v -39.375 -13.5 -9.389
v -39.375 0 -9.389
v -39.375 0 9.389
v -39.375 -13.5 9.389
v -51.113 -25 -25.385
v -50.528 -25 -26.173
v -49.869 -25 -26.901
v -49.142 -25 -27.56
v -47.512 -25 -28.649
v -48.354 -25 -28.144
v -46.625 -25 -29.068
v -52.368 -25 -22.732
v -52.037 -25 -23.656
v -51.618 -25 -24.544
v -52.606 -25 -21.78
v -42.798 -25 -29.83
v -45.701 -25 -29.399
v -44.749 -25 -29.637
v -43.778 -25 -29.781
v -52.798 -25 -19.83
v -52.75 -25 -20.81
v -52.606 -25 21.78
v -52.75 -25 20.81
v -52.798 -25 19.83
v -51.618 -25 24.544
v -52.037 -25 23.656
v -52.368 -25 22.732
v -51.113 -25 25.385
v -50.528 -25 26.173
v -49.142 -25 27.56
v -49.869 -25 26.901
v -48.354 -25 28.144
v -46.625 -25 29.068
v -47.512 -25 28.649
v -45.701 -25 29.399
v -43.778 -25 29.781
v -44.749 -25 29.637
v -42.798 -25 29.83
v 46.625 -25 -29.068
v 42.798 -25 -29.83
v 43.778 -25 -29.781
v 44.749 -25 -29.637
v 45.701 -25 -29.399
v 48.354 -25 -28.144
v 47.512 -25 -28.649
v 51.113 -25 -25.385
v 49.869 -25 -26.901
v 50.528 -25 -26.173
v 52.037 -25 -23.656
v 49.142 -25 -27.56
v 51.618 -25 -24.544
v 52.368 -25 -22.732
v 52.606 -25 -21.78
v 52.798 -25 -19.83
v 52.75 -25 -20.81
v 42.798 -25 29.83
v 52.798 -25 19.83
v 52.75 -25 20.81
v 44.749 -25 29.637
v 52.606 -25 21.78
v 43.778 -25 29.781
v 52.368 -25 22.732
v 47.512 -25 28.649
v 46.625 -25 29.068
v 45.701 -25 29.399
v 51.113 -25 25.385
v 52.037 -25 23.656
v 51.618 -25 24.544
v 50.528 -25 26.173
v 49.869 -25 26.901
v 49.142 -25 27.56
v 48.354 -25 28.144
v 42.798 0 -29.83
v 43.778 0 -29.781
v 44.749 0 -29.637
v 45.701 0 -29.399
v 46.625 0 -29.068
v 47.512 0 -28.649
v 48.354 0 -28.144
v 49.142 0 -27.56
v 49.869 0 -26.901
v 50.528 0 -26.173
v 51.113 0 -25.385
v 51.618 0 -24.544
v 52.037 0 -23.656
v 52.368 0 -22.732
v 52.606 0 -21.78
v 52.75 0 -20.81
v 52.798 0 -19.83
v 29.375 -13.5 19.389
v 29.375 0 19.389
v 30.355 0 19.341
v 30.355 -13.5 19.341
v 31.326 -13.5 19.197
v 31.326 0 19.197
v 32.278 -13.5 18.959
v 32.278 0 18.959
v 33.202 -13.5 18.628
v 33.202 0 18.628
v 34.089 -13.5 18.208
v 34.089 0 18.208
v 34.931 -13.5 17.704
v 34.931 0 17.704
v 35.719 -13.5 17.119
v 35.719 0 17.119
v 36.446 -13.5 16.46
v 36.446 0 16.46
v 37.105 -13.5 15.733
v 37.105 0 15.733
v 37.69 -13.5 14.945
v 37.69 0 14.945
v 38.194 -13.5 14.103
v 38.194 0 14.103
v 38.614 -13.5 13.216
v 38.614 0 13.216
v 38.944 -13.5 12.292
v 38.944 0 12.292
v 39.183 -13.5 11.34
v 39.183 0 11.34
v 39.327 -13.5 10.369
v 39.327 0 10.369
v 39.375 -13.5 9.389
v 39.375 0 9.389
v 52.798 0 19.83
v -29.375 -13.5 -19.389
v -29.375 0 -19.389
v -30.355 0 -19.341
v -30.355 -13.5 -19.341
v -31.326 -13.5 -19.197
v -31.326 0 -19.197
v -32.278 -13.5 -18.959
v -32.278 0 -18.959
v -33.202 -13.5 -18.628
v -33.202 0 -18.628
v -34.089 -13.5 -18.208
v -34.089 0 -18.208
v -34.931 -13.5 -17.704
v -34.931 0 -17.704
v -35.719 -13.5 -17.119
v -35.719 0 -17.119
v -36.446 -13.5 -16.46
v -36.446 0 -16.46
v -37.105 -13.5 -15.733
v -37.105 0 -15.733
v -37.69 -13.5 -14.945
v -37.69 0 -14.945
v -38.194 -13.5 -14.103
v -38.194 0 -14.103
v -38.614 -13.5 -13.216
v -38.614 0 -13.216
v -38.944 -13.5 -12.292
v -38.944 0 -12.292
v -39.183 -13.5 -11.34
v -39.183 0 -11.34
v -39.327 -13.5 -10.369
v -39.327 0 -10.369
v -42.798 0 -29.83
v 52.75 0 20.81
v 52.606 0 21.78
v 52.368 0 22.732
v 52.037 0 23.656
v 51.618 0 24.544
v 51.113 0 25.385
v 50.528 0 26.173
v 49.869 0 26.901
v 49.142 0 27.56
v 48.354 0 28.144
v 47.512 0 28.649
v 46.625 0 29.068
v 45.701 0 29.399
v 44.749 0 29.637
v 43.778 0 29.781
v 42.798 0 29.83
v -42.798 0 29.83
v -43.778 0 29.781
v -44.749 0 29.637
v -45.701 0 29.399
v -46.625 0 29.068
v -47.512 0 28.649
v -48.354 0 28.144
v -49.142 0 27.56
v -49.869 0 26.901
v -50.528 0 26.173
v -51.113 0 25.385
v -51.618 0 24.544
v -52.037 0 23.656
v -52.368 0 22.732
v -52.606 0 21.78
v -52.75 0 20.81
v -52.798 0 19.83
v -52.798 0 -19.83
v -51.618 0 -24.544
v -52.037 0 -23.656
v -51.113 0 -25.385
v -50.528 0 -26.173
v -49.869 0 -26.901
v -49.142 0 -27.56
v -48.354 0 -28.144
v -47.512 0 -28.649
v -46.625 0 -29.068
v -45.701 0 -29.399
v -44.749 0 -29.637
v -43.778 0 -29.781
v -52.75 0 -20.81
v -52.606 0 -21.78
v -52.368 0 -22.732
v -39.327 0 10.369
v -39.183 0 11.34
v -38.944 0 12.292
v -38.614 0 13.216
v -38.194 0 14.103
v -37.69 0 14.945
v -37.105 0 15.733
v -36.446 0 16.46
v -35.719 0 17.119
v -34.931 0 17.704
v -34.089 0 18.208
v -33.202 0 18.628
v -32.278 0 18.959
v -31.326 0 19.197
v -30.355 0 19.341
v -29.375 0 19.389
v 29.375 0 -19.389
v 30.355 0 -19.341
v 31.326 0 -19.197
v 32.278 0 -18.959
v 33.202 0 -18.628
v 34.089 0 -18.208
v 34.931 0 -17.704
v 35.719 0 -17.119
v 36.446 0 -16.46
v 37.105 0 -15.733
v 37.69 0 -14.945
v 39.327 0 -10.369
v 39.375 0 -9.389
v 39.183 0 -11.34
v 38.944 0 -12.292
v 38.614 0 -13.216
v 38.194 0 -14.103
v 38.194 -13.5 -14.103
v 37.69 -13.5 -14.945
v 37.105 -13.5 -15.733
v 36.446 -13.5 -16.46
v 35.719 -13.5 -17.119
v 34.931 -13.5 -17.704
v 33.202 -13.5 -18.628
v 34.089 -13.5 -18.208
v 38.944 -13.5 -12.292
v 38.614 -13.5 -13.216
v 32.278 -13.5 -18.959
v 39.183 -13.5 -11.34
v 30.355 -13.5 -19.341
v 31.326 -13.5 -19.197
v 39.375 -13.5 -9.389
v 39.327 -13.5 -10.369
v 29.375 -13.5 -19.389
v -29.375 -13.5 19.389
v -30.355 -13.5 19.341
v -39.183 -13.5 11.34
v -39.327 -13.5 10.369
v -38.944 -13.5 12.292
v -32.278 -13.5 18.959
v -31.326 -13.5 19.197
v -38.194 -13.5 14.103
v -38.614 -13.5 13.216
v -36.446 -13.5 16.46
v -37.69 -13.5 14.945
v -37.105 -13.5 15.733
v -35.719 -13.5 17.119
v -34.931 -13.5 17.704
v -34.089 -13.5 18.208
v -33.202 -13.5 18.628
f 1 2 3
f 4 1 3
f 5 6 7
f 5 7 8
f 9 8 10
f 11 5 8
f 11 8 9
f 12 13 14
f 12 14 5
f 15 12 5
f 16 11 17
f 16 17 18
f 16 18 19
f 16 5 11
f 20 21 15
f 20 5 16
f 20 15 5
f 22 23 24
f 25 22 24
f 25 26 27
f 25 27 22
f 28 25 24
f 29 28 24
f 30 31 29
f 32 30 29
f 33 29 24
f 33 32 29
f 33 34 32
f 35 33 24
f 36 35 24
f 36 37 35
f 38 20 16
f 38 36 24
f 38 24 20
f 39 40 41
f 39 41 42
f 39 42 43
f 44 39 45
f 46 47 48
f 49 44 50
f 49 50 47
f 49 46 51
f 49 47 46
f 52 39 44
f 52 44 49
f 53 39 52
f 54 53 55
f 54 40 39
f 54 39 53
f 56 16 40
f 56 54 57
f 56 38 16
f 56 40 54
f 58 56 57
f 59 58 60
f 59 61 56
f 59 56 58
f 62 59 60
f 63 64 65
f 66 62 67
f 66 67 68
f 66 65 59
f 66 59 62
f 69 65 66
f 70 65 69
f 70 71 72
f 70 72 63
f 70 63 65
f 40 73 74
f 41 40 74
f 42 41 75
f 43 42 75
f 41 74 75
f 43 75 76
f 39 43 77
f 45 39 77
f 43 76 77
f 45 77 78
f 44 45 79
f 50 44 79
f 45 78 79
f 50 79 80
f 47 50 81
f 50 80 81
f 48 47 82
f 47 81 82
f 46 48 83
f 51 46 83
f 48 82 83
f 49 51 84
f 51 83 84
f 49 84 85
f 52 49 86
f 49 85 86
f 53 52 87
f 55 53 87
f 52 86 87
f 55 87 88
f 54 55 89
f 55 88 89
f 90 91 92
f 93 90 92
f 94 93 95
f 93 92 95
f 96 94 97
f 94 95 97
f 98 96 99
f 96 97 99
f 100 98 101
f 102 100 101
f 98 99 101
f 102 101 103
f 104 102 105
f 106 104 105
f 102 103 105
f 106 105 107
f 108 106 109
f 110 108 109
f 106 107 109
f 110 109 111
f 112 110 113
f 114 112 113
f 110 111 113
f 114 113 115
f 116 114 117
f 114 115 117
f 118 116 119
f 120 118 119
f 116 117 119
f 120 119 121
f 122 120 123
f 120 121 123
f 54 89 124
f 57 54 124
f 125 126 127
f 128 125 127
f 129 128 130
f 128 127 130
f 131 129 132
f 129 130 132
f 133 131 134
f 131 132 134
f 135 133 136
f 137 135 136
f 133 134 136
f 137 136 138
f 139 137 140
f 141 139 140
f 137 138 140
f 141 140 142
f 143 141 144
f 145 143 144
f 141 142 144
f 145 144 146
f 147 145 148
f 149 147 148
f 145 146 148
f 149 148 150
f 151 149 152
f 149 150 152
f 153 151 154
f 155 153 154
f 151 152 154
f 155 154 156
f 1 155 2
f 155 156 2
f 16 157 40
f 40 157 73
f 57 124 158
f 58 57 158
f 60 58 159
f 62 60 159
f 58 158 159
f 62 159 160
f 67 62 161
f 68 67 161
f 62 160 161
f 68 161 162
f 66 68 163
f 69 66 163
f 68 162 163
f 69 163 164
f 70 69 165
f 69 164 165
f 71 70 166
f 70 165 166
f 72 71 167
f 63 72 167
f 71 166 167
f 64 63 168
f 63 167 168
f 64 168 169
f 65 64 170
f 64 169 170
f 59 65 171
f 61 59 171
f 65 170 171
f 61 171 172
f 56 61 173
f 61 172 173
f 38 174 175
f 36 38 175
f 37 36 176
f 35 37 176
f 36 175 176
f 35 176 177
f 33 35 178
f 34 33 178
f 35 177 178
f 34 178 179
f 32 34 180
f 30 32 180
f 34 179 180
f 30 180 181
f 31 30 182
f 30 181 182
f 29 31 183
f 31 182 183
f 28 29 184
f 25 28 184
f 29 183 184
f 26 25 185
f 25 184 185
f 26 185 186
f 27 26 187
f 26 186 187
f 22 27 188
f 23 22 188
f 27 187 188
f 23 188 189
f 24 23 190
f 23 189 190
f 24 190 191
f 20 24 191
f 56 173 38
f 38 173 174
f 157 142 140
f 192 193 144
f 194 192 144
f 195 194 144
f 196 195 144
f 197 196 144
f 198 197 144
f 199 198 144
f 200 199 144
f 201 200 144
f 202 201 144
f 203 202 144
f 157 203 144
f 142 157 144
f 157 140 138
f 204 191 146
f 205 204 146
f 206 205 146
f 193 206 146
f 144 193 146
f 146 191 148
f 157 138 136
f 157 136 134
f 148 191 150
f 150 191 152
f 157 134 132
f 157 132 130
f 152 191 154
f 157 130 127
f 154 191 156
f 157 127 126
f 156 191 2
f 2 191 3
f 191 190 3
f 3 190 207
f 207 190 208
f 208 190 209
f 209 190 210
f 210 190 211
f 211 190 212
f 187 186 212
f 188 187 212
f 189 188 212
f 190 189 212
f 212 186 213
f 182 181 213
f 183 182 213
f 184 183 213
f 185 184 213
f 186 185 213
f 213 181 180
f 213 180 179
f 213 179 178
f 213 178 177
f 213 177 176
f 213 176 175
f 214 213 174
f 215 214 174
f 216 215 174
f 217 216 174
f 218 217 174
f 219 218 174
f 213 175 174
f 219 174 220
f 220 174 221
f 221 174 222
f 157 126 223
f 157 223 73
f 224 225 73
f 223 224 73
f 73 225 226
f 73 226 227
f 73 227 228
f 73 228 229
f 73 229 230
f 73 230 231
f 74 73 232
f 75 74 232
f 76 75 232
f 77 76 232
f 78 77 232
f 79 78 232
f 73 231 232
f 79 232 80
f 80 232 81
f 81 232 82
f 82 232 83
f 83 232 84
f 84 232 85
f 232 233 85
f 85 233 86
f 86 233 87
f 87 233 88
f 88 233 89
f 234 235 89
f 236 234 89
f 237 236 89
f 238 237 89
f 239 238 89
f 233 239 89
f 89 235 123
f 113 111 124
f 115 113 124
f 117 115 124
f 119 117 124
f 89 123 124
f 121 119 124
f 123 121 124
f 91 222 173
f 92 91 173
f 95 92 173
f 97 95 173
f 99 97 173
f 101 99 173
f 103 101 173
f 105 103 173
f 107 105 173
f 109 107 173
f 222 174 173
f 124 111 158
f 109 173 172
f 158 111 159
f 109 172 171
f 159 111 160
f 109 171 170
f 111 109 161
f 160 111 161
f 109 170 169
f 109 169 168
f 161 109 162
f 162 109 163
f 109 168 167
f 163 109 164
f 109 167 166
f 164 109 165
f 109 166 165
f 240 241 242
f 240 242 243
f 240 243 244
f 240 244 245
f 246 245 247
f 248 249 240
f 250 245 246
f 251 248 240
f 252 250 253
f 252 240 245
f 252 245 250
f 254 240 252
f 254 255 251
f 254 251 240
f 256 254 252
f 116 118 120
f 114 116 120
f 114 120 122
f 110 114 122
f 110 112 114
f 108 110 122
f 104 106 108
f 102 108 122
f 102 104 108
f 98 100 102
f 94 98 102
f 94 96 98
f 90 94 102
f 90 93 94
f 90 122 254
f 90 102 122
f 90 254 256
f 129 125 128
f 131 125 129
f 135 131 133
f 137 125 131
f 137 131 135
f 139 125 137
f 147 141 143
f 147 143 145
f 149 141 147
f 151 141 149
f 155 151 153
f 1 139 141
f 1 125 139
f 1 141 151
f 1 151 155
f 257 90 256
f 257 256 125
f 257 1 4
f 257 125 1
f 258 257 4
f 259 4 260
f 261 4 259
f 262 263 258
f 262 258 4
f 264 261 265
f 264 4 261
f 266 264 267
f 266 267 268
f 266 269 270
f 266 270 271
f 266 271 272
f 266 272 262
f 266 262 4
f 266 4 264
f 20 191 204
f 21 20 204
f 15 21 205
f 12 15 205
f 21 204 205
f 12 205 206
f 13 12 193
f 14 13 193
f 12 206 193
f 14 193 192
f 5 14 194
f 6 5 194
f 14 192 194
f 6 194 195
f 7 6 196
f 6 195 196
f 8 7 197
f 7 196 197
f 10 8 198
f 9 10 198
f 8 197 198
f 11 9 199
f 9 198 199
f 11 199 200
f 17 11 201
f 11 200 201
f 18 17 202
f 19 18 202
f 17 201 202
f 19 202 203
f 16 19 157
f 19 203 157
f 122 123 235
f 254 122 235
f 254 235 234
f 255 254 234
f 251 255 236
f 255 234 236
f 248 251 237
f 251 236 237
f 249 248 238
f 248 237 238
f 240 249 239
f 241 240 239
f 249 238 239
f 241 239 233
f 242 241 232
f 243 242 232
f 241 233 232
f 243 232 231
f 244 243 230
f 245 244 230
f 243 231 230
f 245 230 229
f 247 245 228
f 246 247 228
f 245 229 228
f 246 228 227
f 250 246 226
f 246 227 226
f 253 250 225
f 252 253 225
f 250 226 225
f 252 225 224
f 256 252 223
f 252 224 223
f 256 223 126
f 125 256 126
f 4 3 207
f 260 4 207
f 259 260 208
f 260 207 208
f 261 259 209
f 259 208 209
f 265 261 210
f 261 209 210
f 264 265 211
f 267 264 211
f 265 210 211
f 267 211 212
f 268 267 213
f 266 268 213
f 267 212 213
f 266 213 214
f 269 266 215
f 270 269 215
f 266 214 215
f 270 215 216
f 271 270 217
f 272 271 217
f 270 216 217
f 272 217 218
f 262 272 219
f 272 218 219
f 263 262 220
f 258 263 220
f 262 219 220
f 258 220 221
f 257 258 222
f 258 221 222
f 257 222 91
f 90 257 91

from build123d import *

# Parameters (mm, degrees)
F1_DEPTH = 25
F3_DEPTH = 13.5


with BuildPart() as f1:
    # F0 (on Front) → F1 (new body)
    with BuildSketch(Plane.XZ):
        with BuildLine():
            ThreePointArc((-52.798297, -19.829547), (-49.869365, -26.900615), (-42.798297, -29.829547))
            Line((-42.798297, -29.829547), (42.798297, -29.829547))
            ThreePointArc((42.798297, -29.829547), (49.869365, -26.900615), (52.798297, -19.829547))
            Line((52.798297, -19.829547), (52.798297, 19.829547))
            ThreePointArc((52.798297, 19.829547), (49.869365, 26.900615), (42.798297, 29.829547))
            Line((42.798297, 29.829547), (-42.798297, 29.829547))
            ThreePointArc((-42.798297, 29.829547), (-49.869365, 26.900615), (-52.798297, 19.829547))
            Line((-52.798297, 19.829547), (-52.798297, -19.829547))
        make_face()
    extrude(amount=F1_DEPTH)

    # F2 (on face) → F3 (cut)
    with BuildSketch(Plane(origin=(0, 0, 0), x_dir=(-1, 0, 0), z_dir=(0, 1, 0))):
        with BuildLine():
            ThreePointArc((-39.375003, -9.389205), (-36.446071, -16.460272), (-29.375003, -19.389205))
            Line((-29.375003, -19.389205), (29.375003, -19.389205))
            ThreePointArc((29.375003, -19.389205), (36.446071, -16.460272), (39.375003, -9.389205))
            Line((39.375003, -9.389205), (39.375003, 9.389205))
            ThreePointArc((39.375003, 9.389205), (36.446071, 16.460272), (29.375003, 19.389205))
            Line((29.375003, 19.389205), (-29.375003, 19.389205))
            ThreePointArc((-29.375003, 19.389205), (-36.446071, 16.460272), (-39.375003, 9.389205))
            Line((-39.375003, 9.389205), (-39.375003, -9.389205))
        make_face()
    extrude(amount=-F3_DEPTH, mode=Mode.SUBTRACT)


solid = f1.part
